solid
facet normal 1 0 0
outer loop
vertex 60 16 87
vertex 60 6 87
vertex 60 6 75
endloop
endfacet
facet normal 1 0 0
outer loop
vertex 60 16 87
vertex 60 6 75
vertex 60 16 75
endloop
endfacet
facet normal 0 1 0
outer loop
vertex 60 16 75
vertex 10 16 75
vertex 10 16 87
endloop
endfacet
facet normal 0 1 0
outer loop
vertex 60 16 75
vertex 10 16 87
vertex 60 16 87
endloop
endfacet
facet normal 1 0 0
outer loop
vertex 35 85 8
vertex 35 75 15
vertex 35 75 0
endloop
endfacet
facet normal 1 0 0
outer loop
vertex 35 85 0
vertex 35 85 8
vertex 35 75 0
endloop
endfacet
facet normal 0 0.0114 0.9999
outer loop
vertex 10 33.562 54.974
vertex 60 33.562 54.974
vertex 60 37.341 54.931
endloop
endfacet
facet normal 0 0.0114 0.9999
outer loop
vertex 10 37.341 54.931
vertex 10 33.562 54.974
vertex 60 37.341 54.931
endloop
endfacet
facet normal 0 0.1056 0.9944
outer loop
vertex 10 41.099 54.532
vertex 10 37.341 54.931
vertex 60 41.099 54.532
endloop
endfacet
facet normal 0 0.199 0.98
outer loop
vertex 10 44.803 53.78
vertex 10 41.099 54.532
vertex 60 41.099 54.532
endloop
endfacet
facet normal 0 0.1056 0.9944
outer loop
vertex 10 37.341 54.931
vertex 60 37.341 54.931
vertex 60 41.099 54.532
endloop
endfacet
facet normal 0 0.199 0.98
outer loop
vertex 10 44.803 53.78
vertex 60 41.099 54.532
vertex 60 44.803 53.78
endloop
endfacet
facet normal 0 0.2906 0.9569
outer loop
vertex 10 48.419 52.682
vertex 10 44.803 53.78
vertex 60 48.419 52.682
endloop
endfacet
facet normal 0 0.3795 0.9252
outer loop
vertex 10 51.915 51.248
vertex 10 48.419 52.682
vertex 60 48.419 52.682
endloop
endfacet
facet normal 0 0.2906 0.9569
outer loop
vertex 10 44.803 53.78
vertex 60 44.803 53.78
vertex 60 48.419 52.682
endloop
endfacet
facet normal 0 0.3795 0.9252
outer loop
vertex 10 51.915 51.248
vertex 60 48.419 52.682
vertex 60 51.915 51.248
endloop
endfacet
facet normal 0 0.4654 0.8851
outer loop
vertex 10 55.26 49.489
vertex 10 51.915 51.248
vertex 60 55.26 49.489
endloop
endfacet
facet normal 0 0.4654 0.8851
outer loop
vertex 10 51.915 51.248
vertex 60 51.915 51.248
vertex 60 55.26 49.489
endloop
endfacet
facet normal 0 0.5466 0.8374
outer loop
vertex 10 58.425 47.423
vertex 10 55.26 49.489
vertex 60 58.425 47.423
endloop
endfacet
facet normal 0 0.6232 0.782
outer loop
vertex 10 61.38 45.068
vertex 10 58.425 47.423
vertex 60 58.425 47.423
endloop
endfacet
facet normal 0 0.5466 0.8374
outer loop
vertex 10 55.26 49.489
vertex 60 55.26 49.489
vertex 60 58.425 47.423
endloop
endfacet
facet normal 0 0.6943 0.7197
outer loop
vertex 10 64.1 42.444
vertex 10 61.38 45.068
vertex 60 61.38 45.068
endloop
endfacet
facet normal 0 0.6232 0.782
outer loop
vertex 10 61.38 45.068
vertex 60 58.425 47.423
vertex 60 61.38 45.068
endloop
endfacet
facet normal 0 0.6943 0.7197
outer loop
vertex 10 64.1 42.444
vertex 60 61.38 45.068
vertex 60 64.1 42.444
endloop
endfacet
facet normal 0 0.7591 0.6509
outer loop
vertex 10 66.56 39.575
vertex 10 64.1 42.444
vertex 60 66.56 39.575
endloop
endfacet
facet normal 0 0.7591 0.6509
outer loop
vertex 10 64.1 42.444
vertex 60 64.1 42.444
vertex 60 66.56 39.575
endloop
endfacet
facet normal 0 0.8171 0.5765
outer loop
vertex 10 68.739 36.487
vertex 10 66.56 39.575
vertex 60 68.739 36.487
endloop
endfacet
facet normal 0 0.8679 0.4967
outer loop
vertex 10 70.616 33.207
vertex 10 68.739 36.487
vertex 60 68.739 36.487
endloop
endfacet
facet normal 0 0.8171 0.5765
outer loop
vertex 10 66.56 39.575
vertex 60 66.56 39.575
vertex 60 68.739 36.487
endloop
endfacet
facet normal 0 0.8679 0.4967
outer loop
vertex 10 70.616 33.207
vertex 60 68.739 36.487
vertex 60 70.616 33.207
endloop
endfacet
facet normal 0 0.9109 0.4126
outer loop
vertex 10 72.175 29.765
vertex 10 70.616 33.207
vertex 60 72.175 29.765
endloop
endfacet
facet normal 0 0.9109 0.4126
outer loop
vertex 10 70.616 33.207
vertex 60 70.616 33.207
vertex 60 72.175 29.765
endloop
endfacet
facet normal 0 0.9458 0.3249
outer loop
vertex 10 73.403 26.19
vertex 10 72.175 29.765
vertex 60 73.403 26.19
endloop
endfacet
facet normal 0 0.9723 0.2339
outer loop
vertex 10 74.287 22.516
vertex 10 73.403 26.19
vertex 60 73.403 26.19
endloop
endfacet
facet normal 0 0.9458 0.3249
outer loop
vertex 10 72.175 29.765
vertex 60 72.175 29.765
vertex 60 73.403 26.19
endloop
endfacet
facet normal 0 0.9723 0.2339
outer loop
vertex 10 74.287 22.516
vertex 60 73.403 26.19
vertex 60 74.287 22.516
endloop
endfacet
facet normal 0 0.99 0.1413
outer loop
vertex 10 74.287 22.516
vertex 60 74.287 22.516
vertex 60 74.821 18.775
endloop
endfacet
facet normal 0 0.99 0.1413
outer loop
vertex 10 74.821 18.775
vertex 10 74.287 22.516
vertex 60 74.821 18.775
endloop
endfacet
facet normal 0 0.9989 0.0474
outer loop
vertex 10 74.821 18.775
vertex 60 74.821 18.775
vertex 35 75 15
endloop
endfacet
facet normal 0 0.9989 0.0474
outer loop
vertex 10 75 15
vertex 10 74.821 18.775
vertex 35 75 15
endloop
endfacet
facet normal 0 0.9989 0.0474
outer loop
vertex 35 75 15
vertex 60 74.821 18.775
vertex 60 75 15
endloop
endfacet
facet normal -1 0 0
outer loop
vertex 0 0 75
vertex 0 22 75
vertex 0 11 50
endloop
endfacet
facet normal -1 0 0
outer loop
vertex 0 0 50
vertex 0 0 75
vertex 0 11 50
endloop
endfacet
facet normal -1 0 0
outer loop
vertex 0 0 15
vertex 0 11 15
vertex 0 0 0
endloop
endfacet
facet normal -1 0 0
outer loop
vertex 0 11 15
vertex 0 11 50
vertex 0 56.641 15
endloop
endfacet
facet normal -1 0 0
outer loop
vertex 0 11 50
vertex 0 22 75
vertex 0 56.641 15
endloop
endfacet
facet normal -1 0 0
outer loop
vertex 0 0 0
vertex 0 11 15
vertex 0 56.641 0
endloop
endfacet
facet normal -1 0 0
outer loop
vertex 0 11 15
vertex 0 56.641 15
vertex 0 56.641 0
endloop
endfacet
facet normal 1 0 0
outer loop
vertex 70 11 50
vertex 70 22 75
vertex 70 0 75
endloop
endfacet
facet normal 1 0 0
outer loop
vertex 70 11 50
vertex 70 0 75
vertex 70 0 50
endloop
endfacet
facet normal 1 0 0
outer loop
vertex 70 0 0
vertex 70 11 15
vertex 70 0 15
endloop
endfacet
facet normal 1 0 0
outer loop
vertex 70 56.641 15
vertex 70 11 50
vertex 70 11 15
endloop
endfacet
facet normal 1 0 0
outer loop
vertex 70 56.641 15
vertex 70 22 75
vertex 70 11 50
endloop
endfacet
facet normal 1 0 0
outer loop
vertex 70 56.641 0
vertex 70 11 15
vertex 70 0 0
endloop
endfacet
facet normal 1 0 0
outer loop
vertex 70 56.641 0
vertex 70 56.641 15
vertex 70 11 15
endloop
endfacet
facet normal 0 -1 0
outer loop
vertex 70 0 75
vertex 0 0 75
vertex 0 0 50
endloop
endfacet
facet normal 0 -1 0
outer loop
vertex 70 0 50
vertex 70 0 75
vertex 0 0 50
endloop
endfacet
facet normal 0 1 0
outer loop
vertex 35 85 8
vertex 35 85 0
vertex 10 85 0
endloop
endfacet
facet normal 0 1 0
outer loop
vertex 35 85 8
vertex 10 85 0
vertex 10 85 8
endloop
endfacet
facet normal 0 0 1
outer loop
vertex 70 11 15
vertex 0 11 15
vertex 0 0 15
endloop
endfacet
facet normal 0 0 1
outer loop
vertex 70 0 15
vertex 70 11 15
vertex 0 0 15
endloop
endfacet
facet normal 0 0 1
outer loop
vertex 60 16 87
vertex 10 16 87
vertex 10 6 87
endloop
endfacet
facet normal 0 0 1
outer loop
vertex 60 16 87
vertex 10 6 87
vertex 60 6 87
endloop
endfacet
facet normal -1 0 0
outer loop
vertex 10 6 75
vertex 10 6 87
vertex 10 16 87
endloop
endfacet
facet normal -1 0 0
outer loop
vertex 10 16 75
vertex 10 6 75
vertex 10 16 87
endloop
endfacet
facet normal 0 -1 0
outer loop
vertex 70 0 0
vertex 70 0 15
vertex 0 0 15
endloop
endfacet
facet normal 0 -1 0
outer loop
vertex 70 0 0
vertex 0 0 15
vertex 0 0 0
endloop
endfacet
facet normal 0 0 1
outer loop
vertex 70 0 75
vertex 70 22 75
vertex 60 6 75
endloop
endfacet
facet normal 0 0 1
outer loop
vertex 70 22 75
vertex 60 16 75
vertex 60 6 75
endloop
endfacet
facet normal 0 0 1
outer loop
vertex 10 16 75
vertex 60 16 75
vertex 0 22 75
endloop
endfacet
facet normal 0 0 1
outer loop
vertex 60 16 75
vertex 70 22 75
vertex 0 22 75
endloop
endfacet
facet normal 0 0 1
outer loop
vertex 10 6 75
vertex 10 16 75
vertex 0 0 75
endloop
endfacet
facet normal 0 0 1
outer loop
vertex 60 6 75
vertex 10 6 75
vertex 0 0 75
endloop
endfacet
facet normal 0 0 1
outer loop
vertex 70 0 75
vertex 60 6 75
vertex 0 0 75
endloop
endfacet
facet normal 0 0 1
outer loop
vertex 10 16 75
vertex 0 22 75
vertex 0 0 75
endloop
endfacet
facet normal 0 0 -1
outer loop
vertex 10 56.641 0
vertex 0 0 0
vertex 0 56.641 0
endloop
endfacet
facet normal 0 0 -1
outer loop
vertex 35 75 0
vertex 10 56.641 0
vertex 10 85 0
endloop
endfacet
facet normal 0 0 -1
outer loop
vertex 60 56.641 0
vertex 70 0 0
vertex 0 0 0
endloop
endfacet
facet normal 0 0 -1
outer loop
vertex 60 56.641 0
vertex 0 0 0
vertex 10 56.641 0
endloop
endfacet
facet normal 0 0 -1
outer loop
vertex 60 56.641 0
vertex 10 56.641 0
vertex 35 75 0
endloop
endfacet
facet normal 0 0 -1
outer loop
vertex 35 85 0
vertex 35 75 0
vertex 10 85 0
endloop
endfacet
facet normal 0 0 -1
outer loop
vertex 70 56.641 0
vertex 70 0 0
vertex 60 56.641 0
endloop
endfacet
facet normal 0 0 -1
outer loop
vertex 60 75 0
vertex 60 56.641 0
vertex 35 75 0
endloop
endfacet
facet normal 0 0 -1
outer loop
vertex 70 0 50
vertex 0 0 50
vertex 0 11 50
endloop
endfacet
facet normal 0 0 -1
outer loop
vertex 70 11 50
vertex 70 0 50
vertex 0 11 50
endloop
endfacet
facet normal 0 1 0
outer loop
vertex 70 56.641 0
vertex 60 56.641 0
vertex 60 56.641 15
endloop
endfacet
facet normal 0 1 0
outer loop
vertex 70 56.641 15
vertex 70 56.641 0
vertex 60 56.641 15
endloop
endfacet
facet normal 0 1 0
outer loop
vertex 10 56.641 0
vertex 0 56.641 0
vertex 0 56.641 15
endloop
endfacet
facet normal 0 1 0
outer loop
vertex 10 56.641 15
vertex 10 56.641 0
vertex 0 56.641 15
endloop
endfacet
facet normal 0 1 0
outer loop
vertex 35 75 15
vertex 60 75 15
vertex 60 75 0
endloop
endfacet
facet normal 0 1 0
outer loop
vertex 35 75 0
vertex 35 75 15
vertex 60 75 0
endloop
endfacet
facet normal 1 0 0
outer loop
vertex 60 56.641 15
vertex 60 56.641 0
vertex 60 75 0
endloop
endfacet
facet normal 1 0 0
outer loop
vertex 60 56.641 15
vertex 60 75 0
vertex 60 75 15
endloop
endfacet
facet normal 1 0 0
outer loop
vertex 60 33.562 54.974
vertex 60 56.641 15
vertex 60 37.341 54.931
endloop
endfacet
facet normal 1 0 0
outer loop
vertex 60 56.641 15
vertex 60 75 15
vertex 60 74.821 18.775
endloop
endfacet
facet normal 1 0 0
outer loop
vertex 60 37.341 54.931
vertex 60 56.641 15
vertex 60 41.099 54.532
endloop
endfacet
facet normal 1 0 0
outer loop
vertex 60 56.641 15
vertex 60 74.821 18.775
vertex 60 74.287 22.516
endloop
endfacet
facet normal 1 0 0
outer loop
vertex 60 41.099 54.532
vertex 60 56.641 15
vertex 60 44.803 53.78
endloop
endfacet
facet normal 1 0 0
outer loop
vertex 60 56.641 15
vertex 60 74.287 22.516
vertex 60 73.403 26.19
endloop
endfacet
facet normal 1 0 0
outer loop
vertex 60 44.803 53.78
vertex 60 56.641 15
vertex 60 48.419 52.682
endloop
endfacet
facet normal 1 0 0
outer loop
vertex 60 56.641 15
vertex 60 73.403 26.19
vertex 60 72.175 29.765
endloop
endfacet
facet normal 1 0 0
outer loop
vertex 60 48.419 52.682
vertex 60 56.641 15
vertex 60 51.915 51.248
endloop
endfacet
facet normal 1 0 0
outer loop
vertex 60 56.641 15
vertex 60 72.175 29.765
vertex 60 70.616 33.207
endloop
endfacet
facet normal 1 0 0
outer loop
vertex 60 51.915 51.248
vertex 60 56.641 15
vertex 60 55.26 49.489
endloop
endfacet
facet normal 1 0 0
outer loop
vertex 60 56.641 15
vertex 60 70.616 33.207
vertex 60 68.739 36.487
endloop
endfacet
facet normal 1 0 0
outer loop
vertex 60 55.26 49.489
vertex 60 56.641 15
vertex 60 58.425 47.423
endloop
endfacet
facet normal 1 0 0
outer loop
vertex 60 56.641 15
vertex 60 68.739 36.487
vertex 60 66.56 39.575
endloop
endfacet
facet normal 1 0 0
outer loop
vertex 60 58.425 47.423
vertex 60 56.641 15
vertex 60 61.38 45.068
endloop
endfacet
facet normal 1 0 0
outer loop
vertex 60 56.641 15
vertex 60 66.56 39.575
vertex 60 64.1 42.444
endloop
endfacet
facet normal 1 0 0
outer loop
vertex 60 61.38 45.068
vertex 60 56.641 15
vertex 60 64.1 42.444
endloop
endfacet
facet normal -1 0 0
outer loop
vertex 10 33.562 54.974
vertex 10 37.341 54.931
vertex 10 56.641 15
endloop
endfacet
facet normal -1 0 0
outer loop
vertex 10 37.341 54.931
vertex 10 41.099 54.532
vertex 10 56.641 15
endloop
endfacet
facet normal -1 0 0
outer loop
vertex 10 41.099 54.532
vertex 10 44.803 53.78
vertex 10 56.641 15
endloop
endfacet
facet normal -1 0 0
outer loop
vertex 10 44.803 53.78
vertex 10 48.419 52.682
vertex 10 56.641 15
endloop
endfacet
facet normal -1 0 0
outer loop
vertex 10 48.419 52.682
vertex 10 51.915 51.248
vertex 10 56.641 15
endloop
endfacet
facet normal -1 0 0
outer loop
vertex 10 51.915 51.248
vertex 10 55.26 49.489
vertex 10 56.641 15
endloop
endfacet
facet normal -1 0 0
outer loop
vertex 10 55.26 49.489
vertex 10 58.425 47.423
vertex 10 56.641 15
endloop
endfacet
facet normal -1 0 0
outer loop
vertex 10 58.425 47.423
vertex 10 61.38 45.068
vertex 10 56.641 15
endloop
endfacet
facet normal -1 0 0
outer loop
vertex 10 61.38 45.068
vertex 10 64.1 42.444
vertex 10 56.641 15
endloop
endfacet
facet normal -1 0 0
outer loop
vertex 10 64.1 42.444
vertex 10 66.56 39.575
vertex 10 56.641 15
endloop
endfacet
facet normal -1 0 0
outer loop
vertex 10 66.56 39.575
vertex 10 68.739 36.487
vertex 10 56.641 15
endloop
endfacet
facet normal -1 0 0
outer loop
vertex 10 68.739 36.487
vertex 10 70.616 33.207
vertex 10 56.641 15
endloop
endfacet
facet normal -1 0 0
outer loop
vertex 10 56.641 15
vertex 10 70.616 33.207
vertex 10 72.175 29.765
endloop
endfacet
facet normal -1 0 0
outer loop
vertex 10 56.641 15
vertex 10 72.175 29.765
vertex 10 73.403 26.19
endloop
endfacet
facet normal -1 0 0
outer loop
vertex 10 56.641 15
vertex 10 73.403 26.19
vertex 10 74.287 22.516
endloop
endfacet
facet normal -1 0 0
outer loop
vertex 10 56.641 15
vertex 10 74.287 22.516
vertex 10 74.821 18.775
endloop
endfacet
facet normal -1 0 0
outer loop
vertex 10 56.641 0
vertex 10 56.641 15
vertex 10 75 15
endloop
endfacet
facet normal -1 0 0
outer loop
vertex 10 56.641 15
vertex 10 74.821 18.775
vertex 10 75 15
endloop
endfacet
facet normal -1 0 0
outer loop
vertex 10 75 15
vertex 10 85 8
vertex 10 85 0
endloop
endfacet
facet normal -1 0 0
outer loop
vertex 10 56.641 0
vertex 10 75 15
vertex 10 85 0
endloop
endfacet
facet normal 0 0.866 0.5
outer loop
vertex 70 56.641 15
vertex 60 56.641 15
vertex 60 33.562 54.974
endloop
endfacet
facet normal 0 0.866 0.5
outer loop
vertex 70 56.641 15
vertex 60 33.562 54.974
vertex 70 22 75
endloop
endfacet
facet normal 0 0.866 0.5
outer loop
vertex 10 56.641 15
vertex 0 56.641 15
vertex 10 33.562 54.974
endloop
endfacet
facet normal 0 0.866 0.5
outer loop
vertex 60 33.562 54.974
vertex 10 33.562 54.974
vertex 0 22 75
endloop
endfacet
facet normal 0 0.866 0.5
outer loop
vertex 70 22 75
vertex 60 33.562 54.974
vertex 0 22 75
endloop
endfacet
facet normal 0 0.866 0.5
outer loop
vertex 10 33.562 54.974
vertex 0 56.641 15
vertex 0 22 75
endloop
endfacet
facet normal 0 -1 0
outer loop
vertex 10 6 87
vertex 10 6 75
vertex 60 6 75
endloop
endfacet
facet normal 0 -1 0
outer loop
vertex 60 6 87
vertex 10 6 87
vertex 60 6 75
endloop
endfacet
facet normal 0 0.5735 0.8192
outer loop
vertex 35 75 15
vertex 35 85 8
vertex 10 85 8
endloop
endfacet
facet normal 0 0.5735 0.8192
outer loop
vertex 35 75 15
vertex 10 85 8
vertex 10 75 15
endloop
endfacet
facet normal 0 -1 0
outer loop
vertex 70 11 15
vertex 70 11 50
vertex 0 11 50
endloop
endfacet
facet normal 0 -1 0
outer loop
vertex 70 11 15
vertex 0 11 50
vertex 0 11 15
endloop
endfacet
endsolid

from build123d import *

# Parameters (mm, degrees)
BOSS_EXTRUDE1_DEPTH = 70
SKETCH2_W           = 50
SKETCH2_H           = 10
BOSS_EXTRUDE2_DEPTH = 12
BOSS_EXTRUDE3_DEPTH = 25
BOSS_EXTRUDE4_DEPTH = 25


with BuildPart() as part:
    # Sketch1 → Boss-Extrude1 (new body)
    with BuildSketch(Plane(origin=(0, 0, 0), x_dir=(0, 0, -1), z_dir=(1, 0, 0))):
        Polygon((0, 0), (0, 56.641016151), (-15, 56.641016151), (-75, 22), (-75, 0), (-50, 0), (-50, 11), (-15, 11), (-15, 0), align=None)
    extrude(amount=BOSS_EXTRUDE1_DEPTH)

    # Sketch2 → Boss-Extrude2 (add)
    with BuildSketch(Plane.XY.offset(75)):
        with Locations((35, 11)):
            Rectangle(SKETCH2_W, SKETCH2_H)
    extrude(amount=BOSS_EXTRUDE2_DEPTH)

    # Sketch3 → Boss-Extrude3 (add, symmetric)
    with BuildSketch(Plane(origin=(35, 0, 0), x_dir=(0, 0, -1), z_dir=(1, 0, 0))):
        with BuildLine():
            Line((-15, 75), (0, 75))
            Line((0, 75), (0, 56.641016151))
            Line((0, 56.641016151), (-15, 56.641016151))
            Line((-15, 56.641016151), (-54.974141253, 33.561934939))
            ThreePointArc((-54.974141253, 33.561934939), (-43.788214624, 62.771184684), (-15, 75))
        make_face()
    extrude(amount=BOSS_EXTRUDE3_DEPTH, both=True)

    # Sketch4 → Boss-Extrude4 (add)
    with BuildSketch(Plane(origin=(35, 0, 0), x_dir=(0, 0, -1), z_dir=(1, 0, 0))):
        Polygon((0, 75), (0, 85), (-8, 85), (-15, 75), align=None)
    extrude(amount=-BOSS_EXTRUDE4_DEPTH)


solid = part.part
